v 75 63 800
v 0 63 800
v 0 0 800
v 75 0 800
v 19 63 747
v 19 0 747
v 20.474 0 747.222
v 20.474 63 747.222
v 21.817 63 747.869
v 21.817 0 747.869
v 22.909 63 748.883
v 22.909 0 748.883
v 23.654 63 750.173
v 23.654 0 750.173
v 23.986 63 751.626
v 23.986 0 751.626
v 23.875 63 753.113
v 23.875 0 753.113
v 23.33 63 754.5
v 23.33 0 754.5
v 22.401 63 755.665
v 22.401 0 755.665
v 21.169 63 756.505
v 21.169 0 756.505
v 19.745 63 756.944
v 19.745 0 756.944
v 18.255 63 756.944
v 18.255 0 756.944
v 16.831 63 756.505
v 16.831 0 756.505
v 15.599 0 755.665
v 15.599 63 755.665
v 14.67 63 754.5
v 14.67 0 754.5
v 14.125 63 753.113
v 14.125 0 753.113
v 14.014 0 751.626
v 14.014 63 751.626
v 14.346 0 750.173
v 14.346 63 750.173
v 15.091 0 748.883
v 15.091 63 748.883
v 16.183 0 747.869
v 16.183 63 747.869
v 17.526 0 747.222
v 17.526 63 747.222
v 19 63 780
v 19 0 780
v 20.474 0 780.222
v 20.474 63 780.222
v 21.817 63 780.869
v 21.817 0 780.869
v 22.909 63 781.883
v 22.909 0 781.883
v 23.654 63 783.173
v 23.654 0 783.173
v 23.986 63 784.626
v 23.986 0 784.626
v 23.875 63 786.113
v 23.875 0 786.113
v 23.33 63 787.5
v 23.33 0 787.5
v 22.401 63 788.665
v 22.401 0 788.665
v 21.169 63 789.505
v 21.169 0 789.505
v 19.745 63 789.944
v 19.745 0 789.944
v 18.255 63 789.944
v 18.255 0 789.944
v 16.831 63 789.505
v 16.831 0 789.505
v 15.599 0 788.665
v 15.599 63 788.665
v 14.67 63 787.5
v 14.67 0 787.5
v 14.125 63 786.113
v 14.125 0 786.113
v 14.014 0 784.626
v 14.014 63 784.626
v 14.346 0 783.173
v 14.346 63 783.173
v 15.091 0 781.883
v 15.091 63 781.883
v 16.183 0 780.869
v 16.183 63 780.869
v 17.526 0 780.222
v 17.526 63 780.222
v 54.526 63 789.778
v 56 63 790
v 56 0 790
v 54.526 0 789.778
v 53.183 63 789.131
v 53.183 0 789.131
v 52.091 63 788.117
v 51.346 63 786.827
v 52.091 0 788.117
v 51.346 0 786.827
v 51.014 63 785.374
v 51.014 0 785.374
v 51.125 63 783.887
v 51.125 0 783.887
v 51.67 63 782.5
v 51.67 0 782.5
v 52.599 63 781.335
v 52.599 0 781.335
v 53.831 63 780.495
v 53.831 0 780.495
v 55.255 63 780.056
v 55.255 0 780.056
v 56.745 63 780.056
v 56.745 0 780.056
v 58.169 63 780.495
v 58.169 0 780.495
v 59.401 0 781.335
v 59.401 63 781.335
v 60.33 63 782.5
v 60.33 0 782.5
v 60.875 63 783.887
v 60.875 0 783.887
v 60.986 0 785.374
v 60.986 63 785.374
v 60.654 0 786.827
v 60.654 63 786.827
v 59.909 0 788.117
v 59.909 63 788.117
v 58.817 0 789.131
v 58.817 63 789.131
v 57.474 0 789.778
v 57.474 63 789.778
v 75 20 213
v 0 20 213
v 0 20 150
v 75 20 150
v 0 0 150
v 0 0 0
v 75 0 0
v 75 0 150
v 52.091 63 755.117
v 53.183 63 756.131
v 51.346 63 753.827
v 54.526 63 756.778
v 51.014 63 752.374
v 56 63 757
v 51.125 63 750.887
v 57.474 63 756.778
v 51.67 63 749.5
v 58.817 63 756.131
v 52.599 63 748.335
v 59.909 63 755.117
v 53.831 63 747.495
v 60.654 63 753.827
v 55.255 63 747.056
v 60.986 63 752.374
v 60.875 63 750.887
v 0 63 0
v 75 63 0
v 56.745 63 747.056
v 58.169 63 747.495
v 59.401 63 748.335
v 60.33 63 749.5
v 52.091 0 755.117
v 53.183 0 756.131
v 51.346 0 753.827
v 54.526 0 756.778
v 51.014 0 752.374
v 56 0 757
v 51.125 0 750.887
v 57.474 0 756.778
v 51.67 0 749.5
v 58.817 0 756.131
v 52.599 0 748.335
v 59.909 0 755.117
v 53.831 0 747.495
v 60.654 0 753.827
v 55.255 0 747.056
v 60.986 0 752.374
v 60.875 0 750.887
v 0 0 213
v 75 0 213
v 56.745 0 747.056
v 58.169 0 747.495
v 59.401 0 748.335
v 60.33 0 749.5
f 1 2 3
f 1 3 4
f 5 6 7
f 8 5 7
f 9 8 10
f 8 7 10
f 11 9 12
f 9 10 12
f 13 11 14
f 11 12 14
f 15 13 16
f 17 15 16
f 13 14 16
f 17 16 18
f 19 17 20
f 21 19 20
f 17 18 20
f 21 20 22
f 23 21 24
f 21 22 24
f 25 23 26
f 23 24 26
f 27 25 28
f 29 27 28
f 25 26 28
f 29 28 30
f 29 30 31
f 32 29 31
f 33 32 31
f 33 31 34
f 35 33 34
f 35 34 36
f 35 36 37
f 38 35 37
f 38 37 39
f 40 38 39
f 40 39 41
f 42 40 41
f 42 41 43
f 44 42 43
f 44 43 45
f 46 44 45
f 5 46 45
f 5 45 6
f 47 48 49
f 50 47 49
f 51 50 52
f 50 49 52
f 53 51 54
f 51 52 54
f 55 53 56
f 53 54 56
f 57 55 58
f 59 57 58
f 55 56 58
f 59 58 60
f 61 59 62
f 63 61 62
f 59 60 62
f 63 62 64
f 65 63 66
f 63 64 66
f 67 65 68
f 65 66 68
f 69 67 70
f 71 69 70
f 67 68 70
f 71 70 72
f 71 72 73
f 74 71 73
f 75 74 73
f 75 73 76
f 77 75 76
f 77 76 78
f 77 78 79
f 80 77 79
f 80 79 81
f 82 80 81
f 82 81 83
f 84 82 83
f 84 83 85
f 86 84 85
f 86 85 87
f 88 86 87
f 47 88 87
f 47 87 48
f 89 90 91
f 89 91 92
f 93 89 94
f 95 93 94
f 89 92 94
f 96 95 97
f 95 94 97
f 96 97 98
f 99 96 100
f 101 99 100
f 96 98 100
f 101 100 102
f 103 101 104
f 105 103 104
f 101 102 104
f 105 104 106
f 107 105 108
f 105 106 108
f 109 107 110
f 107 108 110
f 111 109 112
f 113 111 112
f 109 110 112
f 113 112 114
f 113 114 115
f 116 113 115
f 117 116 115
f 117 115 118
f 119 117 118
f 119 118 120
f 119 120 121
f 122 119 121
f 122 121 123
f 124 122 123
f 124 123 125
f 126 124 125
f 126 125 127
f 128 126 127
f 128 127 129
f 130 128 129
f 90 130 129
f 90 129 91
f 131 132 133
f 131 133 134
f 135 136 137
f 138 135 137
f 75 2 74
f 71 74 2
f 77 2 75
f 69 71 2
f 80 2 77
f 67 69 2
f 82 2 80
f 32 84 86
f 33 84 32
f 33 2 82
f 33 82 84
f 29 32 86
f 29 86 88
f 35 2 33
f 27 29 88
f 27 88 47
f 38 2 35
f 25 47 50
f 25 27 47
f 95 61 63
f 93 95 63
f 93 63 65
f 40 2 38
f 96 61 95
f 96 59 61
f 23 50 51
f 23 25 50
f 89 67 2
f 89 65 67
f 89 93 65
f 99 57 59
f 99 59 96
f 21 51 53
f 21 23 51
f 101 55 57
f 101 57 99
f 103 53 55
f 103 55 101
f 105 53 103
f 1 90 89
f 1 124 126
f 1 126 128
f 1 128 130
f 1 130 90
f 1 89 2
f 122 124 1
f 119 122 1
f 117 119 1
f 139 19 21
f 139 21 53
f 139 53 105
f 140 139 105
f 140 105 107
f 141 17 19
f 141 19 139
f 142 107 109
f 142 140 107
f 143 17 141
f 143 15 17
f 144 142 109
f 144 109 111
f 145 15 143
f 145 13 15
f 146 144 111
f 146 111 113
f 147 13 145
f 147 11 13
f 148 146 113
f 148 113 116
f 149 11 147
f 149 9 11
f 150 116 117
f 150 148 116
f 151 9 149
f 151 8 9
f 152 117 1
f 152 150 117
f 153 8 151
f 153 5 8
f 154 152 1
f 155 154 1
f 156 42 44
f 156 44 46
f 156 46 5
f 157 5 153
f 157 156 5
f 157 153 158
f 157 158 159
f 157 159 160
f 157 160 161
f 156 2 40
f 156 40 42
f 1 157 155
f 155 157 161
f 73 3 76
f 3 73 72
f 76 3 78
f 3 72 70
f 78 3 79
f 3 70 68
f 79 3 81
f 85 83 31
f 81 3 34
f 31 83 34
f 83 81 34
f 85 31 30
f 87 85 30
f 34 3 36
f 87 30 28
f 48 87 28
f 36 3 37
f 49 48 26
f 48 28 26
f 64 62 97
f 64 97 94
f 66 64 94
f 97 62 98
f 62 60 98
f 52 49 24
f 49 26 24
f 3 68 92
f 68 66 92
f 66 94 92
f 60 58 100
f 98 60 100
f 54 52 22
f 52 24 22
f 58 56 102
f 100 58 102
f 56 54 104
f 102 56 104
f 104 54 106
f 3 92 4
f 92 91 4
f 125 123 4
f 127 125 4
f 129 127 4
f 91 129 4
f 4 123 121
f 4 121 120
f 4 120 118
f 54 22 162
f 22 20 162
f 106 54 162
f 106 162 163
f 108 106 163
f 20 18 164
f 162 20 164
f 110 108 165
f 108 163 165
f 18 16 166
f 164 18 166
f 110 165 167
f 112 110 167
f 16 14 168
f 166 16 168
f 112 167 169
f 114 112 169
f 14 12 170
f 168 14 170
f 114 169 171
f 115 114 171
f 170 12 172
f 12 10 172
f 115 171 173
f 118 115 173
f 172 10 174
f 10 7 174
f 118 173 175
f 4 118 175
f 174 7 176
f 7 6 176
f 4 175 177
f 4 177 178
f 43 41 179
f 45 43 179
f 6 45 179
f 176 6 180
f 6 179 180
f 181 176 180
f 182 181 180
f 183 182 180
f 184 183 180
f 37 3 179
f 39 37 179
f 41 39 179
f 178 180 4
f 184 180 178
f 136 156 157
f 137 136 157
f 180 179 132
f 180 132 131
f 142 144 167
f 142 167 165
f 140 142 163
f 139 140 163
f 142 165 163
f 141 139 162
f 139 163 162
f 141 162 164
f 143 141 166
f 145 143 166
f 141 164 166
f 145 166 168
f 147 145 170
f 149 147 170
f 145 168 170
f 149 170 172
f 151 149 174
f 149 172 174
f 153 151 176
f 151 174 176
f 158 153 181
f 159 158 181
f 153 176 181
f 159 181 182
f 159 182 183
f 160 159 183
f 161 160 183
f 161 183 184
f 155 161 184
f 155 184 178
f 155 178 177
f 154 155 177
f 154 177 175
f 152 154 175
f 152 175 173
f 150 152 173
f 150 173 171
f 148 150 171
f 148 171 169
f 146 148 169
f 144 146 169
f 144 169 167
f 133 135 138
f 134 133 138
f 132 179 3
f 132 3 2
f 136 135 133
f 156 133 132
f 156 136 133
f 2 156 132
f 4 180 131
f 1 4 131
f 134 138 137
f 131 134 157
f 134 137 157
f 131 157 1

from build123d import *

# Parameters (mm, degrees)
ESQUISSE1_W             = 75
ESQUISSE1_H             = 63
BOSS_EXTRU_1_DEPTH      = 800
ESQUISSE2_R             = 5
ENL_V_MAT_EXTRU_1_DEPTH = 806.973944988
ESQUISSE3_W             = 75
ESQUISSE3_H             = 63
ENL_V_MAT_EXTRU_2_DEPTH = 20


with BuildPart() as part:
    # Esquisse1 → Boss.-Extru.1 (new body)
    with BuildSketch(Plane.XY):
        with Locations((37.5, 31.5)):
            Rectangle(ESQUISSE1_W, ESQUISSE1_H)
    extrude(amount=BOSS_EXTRU_1_DEPTH)

    # Esquisse2 → Enlèv. mat.-Extru.1 (cut, through all)
    with BuildSketch(Plane.XZ):
        with Locations(Location((19, 752, 0), (0, 0, 270))):
            Circle(ESQUISSE2_R)
        with Locations(Location((19, 785, 0), (0, 0, 270))):
            Circle(ESQUISSE2_R)
        with Locations(Location((56, 785, 0), (0, 0, 90))):
            Circle(ESQUISSE2_R)
        with Locations(Location((56, 752, 0), (0, 0, 90))):
            Circle(ESQUISSE2_R)
    extrude(amount=-ENL_V_MAT_EXTRU_1_DEPTH, mode=Mode.SUBTRACT)

    # Esquisse3 → Enlèv. mat.-Extru.2 (cut)
    with BuildSketch(Plane.XZ):
        with Locations((37.5, 181.5)):
            Rectangle(ESQUISSE3_W, ESQUISSE3_H)
    extrude(amount=-ENL_V_MAT_EXTRU_2_DEPTH, mode=Mode.SUBTRACT)


solid = part.part
